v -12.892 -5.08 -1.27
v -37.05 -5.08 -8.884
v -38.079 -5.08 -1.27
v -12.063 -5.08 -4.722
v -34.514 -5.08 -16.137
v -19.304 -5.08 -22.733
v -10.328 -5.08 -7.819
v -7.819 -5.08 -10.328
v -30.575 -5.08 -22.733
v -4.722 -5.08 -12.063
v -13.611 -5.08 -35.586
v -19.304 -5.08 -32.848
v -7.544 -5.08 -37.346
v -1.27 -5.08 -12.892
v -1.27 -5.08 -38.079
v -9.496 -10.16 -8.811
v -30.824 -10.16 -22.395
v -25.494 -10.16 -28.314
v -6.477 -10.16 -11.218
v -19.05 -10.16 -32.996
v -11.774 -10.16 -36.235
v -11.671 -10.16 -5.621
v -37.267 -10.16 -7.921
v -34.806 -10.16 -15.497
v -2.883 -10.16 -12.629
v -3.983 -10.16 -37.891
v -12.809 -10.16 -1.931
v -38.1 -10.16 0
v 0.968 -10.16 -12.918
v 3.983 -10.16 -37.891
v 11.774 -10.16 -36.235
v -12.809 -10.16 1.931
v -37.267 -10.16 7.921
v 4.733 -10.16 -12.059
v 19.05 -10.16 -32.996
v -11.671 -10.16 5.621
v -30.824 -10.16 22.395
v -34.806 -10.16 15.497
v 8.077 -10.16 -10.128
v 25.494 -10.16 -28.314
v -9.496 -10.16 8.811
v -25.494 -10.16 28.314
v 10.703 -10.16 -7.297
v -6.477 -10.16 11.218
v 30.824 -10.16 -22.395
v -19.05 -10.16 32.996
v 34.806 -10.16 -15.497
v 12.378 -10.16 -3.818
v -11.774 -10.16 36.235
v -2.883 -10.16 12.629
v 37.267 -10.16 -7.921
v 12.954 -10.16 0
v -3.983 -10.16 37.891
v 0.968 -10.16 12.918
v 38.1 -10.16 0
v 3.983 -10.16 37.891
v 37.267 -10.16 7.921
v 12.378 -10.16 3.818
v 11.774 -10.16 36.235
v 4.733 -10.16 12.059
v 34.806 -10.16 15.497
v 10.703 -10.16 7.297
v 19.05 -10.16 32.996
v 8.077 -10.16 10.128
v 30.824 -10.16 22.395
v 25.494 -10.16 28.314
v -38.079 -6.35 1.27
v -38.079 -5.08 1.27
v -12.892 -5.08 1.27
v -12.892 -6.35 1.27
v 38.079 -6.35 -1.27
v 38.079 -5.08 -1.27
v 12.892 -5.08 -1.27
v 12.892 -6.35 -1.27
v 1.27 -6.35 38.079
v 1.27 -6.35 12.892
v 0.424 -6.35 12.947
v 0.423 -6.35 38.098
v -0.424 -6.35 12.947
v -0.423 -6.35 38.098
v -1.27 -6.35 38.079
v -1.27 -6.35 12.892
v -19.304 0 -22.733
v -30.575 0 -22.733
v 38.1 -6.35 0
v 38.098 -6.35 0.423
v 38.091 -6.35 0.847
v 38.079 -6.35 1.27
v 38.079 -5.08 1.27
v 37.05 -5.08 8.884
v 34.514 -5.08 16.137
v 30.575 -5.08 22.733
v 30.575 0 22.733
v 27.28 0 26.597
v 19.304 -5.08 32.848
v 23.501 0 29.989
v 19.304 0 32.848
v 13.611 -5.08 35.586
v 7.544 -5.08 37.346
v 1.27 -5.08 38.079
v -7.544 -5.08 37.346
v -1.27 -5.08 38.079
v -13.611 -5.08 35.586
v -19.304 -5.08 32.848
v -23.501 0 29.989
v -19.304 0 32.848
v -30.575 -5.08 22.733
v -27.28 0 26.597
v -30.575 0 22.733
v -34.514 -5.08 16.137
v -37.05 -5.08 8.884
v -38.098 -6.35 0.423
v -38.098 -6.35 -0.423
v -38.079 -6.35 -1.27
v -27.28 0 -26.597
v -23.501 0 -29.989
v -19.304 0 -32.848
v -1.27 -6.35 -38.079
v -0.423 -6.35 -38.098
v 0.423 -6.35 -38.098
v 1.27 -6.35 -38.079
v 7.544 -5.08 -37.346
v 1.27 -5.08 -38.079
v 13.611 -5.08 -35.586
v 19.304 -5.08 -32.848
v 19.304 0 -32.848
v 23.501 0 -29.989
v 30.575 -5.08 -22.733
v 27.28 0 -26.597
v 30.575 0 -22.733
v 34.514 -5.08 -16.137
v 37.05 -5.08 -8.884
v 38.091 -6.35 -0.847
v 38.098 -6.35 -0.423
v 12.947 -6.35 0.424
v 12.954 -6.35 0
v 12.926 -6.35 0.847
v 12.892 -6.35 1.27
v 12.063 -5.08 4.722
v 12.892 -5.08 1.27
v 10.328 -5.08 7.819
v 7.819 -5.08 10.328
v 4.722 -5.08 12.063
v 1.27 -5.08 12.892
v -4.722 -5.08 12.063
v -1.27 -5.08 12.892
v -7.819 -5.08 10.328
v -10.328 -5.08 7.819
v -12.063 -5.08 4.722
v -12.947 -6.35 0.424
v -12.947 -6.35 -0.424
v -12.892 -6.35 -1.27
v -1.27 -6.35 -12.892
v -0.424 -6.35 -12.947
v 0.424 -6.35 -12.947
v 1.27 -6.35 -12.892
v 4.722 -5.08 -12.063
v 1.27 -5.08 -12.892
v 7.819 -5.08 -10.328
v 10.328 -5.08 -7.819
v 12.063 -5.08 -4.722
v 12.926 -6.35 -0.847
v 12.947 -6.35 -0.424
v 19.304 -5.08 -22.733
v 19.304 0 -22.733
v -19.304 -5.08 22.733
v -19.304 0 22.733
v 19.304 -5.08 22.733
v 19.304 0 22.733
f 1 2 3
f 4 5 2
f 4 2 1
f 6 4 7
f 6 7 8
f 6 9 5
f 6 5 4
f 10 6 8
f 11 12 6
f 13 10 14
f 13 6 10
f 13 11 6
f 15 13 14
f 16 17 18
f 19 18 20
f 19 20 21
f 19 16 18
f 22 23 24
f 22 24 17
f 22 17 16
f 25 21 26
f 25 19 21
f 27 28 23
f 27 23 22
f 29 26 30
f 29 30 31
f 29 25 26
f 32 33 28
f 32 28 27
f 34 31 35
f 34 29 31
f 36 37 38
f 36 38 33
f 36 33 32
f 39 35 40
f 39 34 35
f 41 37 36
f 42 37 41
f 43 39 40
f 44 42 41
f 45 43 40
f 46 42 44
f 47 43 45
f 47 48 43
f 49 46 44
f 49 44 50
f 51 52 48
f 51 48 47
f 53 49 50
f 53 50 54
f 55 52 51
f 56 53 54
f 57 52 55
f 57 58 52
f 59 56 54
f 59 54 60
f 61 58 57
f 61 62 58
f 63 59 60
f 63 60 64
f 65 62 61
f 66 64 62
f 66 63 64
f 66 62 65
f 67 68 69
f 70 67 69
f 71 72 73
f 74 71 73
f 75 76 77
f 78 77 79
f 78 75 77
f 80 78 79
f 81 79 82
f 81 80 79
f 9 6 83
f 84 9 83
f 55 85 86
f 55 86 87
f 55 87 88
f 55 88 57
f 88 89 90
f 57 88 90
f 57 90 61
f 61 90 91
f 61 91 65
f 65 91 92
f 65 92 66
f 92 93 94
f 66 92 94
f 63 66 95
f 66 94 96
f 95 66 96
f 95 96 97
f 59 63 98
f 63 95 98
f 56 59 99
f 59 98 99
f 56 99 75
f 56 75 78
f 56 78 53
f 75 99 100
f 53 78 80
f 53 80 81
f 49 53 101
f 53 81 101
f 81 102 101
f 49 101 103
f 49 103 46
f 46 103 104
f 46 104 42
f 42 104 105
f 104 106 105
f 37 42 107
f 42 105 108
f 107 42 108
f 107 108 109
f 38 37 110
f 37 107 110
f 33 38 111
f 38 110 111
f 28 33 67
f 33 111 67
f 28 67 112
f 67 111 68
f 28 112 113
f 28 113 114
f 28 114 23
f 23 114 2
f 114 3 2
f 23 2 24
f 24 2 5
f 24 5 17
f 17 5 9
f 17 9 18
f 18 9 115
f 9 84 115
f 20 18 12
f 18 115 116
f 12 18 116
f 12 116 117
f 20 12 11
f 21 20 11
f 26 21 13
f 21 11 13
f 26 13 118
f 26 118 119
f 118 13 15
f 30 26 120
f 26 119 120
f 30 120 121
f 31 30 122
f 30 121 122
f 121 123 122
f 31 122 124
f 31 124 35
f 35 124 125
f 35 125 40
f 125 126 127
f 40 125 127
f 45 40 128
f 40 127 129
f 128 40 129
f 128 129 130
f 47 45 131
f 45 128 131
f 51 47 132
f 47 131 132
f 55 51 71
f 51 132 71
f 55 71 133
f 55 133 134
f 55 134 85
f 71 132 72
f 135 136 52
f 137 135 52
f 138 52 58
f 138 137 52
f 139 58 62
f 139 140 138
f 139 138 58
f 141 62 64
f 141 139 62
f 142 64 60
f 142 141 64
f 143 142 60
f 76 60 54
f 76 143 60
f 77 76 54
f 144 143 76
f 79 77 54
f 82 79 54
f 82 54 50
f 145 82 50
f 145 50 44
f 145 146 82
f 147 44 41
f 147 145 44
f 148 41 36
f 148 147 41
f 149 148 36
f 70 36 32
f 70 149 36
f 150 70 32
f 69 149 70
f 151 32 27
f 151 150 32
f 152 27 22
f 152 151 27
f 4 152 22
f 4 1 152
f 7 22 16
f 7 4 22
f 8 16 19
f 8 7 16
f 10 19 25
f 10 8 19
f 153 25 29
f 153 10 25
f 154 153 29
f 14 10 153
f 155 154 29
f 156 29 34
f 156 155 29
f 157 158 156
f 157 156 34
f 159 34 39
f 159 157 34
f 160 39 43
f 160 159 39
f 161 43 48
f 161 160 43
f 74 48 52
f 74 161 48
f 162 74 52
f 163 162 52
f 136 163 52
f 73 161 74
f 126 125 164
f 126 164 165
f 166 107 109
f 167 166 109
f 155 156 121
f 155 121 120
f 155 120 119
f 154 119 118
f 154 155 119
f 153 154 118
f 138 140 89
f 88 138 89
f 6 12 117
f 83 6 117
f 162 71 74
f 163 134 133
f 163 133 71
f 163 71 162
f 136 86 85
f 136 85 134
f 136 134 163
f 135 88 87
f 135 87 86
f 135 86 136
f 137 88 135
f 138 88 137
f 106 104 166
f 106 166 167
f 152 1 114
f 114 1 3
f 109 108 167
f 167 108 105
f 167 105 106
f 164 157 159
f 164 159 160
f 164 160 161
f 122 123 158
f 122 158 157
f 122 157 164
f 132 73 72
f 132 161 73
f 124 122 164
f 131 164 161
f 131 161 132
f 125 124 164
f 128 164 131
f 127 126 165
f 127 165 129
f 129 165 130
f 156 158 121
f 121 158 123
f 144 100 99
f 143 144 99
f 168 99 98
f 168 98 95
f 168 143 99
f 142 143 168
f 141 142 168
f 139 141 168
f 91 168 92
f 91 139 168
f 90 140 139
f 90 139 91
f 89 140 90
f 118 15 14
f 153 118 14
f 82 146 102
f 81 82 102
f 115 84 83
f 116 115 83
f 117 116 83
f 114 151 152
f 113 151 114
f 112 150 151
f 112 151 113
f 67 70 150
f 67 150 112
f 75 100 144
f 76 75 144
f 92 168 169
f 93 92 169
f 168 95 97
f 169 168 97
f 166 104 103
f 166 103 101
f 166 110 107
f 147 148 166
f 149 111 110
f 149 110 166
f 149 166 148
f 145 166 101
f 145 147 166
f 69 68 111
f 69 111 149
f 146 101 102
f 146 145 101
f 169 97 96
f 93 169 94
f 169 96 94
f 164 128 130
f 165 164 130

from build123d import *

# Parameters (mm, degrees)
F0_R          = 12.7
F1_DEPTH      = 17.78
F2_R          = 38.1
F3_DEPTH      = 10.16
F4_R          = 12.954
F5_DEPTH      = 17.781
F5_DEPTH_BACK = 115
F6_W          = 5.08
F6_H          = 45.466
F7_DEPTH      = 38.101
F7_DEPTH_BACK = 38.101
F8_W          = 38.608
F8_H          = 5.08
F9_DEPTH      = 38.101
F9_DEPTH_BACK = 38.101
F11_DEPTH     = 6.35


# Not quite as in the source:
# - an extrude ends at something that could not be found from the text; its depth is read off the source's solid


with BuildPart() as f1:
    # F0 (on Front) → F1 (new body)
    with BuildSketch(Plane.XZ):
        Circle(F0_R)
    extrude(amount=F1_DEPTH)

    # F2 (on Front) → F3 (join)
    with BuildSketch(Plane.XZ):
        Circle(F2_R)
    extrude(amount=F3_DEPTH)

    # F4 (on Front) → F5 (cut, two sides)
    with BuildSketch(Plane.XZ) as f5_sk:
        Circle(F4_R)
    extrude(amount=F5_DEPTH, mode=Mode.SUBTRACT)
    extrude(f5_sk.sketch, amount=-F5_DEPTH_BACK, mode=Mode.SUBTRACT)

    # F6 (on Right) → F7 (cut, two sides)
    with BuildSketch(Plane.YZ) as f7_sk:
        with Locations((-2.54, 0)):
            Rectangle(F6_W, F6_H)
    extrude(amount=F7_DEPTH, mode=Mode.SUBTRACT)
    extrude(f7_sk.sketch, amount=-F7_DEPTH_BACK, mode=Mode.SUBTRACT)

    # F8 (on Top) → F9 (cut, two sides)
    with BuildSketch(Plane.XY) as f9_sk:
        with Locations((0, -2.54)):
            Rectangle(F8_W, F8_H)
    extrude(amount=-F9_DEPTH, mode=Mode.SUBTRACT)
    extrude(f9_sk.sketch, amount=F9_DEPTH_BACK, mode=Mode.SUBTRACT)

    # F10 (on face) → F11 (cut)
    with BuildSketch(Plane(origin=(0, 0, 0), x_dir=(-1, 0, 0), z_dir=(0, 1, 0))):
        with BuildLine():
            Line((1.27, -1.27), (38.0788274504, -1.27))
            ThreePointArc((38.0788274504, -1.27), (38.1, 0), (38.0788274504, 1.27))
            Line((38.0788274504, 1.27), (1.27, 1.27))
            Line((1.27, 1.27), (1.27, 38.0788274504))
            ThreePointArc((1.27, 38.0788274504), (0, 38.1), (-1.27, 38.0788274504))
            Line((-1.27, 38.0788274504), (-1.27, 1.27))
            Line((-1.27, 1.27), (-38.0788274504, 1.27))
            ThreePointArc((-38.0788274504, 1.27), (-38.1, 0), (-38.0788274504, -1.27))
            Line((-38.0788274504, -1.27), (-1.27, -1.27))
            Line((-1.27, -1.27), (-1.27, -38.0788274504))
            ThreePointArc((-1.27, -38.0788274504), (0, -38.1), (1.27, -38.0788274504))
            Line((1.27, -38.0788274504), (1.27, -1.27))
        make_face()
    extrude(amount=-F11_DEPTH, mode=Mode.SUBTRACT)


solid = f1.part
